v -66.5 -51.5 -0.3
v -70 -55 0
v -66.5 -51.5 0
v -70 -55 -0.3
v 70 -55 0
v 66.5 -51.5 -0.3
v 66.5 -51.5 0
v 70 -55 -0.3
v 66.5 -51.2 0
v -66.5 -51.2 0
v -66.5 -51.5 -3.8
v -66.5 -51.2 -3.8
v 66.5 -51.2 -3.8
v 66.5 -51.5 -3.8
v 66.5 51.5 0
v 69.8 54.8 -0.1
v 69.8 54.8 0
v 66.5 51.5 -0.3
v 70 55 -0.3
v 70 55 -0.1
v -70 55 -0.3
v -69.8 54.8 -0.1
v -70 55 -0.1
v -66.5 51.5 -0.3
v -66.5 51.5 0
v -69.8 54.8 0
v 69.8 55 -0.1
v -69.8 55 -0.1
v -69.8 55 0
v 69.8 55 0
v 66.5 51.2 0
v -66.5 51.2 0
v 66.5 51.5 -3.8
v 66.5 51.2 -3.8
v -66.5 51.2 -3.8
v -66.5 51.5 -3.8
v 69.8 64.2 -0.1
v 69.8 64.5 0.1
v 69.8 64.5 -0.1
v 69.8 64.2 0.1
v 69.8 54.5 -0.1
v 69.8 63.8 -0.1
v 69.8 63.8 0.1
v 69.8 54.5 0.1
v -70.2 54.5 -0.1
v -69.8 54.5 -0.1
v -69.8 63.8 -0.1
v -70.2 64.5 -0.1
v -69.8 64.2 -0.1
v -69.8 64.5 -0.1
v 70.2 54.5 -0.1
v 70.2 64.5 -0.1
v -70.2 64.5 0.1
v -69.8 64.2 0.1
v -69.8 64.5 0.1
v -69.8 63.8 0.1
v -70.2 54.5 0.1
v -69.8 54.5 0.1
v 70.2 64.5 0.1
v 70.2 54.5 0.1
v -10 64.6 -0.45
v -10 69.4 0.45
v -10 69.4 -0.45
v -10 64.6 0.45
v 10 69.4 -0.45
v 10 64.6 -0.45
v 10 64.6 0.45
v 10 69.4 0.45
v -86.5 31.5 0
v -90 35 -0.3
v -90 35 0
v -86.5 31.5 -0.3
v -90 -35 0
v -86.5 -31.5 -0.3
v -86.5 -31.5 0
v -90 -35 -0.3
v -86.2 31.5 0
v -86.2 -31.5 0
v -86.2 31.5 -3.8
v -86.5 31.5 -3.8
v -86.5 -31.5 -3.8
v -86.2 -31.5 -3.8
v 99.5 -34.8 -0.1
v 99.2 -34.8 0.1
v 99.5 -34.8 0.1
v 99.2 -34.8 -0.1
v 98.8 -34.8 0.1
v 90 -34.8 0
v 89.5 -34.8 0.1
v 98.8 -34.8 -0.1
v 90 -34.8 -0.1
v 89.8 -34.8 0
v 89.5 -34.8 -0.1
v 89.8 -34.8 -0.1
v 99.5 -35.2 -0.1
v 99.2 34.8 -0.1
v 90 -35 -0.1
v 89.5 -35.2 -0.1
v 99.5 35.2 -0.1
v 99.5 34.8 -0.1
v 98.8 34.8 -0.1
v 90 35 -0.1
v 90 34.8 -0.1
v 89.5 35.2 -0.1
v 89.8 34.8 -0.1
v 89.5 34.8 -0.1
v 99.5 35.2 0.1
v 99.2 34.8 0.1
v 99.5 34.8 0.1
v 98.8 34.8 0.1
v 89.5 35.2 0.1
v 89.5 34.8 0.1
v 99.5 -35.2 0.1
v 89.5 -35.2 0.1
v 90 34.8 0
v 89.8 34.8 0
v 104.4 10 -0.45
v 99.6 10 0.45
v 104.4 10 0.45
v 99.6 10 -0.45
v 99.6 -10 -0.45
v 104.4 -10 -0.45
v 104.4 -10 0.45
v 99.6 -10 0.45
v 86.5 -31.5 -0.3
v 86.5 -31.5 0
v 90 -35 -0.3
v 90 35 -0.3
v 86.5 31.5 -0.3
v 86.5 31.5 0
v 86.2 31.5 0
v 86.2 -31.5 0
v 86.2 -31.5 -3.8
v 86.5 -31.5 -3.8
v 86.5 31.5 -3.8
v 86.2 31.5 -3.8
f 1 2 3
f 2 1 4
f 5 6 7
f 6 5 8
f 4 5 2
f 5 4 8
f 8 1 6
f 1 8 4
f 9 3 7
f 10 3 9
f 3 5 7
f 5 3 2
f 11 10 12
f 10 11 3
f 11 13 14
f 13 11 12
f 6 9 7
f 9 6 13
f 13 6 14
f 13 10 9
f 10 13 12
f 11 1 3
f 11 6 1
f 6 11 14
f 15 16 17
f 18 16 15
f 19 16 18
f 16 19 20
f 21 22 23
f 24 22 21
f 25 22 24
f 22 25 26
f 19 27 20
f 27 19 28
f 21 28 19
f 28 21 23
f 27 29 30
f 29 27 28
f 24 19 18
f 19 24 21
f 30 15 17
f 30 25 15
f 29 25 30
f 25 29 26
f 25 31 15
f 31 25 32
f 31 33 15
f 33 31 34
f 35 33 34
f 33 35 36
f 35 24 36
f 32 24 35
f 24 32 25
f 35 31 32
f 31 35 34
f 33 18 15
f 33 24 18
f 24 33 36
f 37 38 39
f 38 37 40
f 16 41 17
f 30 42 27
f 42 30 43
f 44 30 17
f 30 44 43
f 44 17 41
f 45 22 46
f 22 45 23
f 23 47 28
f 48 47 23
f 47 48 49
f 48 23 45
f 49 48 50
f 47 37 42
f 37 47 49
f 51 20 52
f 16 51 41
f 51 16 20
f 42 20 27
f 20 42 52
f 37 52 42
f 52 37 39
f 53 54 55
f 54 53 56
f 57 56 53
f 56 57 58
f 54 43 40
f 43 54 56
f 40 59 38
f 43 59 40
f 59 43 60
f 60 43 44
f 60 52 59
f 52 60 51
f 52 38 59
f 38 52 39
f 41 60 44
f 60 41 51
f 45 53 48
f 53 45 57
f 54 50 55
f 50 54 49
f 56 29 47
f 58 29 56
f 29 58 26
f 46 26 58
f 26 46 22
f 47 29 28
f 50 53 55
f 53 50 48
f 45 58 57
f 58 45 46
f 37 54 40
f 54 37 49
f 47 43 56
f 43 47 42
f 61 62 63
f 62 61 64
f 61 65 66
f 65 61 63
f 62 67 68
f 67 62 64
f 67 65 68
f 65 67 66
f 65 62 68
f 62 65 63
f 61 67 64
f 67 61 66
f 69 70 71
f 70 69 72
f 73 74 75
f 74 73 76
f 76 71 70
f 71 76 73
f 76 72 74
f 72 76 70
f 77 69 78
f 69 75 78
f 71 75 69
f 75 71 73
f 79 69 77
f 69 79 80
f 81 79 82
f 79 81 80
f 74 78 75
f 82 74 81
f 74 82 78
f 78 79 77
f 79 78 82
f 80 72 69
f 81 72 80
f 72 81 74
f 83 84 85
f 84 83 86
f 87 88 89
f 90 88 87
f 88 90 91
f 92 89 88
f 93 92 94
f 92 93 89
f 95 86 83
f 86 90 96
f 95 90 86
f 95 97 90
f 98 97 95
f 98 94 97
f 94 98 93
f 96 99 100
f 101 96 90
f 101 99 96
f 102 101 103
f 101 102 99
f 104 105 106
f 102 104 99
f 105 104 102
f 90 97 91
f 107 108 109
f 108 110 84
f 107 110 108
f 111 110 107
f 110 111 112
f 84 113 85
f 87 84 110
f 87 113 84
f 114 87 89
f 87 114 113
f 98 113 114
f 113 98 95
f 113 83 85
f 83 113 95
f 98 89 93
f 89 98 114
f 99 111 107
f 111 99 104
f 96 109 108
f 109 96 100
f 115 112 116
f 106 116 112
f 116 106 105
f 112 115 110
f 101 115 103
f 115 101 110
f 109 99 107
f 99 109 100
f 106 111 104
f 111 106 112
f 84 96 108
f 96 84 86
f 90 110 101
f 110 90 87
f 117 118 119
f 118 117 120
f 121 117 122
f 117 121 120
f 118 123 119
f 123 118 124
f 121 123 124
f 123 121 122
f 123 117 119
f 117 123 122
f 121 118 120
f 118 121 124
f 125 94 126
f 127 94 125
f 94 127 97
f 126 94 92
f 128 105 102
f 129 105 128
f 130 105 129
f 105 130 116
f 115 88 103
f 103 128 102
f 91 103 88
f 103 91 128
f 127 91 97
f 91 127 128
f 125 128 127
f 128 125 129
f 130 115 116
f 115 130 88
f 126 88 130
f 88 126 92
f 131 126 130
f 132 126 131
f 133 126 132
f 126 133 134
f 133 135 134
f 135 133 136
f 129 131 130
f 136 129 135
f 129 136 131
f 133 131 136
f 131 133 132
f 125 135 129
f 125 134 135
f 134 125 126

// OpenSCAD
// file: hdim.scad
module hdim(x1 = 10, x2 = 200, y = 10, dimline_lenght = 9.0) 
{
    dimline_overlap = 0.5;
    dimline_width = 0.4;
    text_size = 4;
    tmp = 2*dimline_overlap+text_size/2;
    text_pos = dimline_lenght>0 ? tmp : -tmp; 
    dimline_abs = dimline_lenght>0 ? dimline_lenght : -dimline_lenght;
    
    color([146/255, 154/255, 255/255, 0.7])
    {
        translate([x1,y-dimline_lenght/2,0]) 
            cube([dimline_width, 
                dimline_abs + 2*dimline_overlap,
                dimline_width/2], 
                center=true);
                
        translate([x2,y-dimline_lenght/2,0]) 
            cube([dimline_width, 
                dimline_abs + 2*dimline_overlap,
                dimline_width/2], 
                center=true);

        translate([(x1+x2)/2,y-dimline_lenght,0]) 
            cube([x2-x1, 
                dimline_width,
                dimline_width/2], 
                center=true);
    }
        
    translate([(x1+x2)/2,y-dimline_lenght-text_pos,0]) 
    {
        color([106/255, 134/255, 245/255])
        cube([text_size * 5, 1.2*text_size, 0.9], center=true);
        
        color([0,0,0,1])
        {
            translate([0,0,0.2])
            text(str(0.1*round((x2-x1)*10)), size = text_size, 
                halign = "center",valign = "center");
            translate([0,0,-0.2])
            rotate([0,180,0])
            text(str(0.1*round((x2-x1)*10)), size = text_size, 
                halign = "center",valign = "center");
        }
    }
}

hdim();
// main file
use <hdim.scad> 

default_bar_diam = 3.8;
default_bar_t  = 0.3;

module anglebarframe(length = 140, width = 70, 
    bar_diam = default_bar_diam, 
    bar_t = default_bar_t, 
    explode=false, 
    explode_d = 20, 
    c1 = [0.5,0.28,0.19, 1.0], 
    c2 = [0.8,0.30,0.29, 1.0],
    flap_outwards = false)
{
    d = explode ? explode_d : 0;
    out_rotate = flap_outwards ? 180 : 0;
      
    rotate([0,180,0])
    {
        translate([-length/2,-width/2-d,0]) 
        anglebar_helper(length, bar_diam, bar_t, c2, flap_outwards);
       
        translate([length/2,width/2+d,0]) 
        rotate([0,0,180]) 
        anglebar_helper(length, bar_diam, bar_t, c1, flap_outwards);
        if (explode) {
            hdim(-length/2, length/2, width/2+d, -9);
        }
            
        translate([d+length/2,-width/2,0]) 
        rotate([0,0,90]) 
        anglebar_helper(width, bar_diam, bar_t, c2, flap_outwards);
        if (explode) {
            rotate([0,0,90]) 
            hdim(-width/2, width/2, length/2+d, -9);
        }
        
        translate([-length/2-d,width/2,0]) 
        rotate([0,0,-90])
        anglebar_helper(width, bar_diam, bar_t, c1, flap_outwards);
    }
}        

module anglebar_helper(length, 
    bar_diam, 
    bar_t,
    c,
    flap_outwards)
{
    color(c) 
    {
        linear_extrude(bar_t) 
        polygon(points=[[0,0],
            [bar_diam, bar_diam],
            [length-bar_diam, bar_diam],
            [length, 0], [0,0]]);
 
        if (flap_outwards) {
            translate([bar_diam-bar_t, bar_diam-bar_t, 0])
            cube([length-2*(bar_diam-bar_t), bar_t, bar_diam]);
        }
        else {
            cube([length, bar_t, bar_diam]);
        }
    }
}   


anglebarframe(explode=true, flap_outwards=true);
